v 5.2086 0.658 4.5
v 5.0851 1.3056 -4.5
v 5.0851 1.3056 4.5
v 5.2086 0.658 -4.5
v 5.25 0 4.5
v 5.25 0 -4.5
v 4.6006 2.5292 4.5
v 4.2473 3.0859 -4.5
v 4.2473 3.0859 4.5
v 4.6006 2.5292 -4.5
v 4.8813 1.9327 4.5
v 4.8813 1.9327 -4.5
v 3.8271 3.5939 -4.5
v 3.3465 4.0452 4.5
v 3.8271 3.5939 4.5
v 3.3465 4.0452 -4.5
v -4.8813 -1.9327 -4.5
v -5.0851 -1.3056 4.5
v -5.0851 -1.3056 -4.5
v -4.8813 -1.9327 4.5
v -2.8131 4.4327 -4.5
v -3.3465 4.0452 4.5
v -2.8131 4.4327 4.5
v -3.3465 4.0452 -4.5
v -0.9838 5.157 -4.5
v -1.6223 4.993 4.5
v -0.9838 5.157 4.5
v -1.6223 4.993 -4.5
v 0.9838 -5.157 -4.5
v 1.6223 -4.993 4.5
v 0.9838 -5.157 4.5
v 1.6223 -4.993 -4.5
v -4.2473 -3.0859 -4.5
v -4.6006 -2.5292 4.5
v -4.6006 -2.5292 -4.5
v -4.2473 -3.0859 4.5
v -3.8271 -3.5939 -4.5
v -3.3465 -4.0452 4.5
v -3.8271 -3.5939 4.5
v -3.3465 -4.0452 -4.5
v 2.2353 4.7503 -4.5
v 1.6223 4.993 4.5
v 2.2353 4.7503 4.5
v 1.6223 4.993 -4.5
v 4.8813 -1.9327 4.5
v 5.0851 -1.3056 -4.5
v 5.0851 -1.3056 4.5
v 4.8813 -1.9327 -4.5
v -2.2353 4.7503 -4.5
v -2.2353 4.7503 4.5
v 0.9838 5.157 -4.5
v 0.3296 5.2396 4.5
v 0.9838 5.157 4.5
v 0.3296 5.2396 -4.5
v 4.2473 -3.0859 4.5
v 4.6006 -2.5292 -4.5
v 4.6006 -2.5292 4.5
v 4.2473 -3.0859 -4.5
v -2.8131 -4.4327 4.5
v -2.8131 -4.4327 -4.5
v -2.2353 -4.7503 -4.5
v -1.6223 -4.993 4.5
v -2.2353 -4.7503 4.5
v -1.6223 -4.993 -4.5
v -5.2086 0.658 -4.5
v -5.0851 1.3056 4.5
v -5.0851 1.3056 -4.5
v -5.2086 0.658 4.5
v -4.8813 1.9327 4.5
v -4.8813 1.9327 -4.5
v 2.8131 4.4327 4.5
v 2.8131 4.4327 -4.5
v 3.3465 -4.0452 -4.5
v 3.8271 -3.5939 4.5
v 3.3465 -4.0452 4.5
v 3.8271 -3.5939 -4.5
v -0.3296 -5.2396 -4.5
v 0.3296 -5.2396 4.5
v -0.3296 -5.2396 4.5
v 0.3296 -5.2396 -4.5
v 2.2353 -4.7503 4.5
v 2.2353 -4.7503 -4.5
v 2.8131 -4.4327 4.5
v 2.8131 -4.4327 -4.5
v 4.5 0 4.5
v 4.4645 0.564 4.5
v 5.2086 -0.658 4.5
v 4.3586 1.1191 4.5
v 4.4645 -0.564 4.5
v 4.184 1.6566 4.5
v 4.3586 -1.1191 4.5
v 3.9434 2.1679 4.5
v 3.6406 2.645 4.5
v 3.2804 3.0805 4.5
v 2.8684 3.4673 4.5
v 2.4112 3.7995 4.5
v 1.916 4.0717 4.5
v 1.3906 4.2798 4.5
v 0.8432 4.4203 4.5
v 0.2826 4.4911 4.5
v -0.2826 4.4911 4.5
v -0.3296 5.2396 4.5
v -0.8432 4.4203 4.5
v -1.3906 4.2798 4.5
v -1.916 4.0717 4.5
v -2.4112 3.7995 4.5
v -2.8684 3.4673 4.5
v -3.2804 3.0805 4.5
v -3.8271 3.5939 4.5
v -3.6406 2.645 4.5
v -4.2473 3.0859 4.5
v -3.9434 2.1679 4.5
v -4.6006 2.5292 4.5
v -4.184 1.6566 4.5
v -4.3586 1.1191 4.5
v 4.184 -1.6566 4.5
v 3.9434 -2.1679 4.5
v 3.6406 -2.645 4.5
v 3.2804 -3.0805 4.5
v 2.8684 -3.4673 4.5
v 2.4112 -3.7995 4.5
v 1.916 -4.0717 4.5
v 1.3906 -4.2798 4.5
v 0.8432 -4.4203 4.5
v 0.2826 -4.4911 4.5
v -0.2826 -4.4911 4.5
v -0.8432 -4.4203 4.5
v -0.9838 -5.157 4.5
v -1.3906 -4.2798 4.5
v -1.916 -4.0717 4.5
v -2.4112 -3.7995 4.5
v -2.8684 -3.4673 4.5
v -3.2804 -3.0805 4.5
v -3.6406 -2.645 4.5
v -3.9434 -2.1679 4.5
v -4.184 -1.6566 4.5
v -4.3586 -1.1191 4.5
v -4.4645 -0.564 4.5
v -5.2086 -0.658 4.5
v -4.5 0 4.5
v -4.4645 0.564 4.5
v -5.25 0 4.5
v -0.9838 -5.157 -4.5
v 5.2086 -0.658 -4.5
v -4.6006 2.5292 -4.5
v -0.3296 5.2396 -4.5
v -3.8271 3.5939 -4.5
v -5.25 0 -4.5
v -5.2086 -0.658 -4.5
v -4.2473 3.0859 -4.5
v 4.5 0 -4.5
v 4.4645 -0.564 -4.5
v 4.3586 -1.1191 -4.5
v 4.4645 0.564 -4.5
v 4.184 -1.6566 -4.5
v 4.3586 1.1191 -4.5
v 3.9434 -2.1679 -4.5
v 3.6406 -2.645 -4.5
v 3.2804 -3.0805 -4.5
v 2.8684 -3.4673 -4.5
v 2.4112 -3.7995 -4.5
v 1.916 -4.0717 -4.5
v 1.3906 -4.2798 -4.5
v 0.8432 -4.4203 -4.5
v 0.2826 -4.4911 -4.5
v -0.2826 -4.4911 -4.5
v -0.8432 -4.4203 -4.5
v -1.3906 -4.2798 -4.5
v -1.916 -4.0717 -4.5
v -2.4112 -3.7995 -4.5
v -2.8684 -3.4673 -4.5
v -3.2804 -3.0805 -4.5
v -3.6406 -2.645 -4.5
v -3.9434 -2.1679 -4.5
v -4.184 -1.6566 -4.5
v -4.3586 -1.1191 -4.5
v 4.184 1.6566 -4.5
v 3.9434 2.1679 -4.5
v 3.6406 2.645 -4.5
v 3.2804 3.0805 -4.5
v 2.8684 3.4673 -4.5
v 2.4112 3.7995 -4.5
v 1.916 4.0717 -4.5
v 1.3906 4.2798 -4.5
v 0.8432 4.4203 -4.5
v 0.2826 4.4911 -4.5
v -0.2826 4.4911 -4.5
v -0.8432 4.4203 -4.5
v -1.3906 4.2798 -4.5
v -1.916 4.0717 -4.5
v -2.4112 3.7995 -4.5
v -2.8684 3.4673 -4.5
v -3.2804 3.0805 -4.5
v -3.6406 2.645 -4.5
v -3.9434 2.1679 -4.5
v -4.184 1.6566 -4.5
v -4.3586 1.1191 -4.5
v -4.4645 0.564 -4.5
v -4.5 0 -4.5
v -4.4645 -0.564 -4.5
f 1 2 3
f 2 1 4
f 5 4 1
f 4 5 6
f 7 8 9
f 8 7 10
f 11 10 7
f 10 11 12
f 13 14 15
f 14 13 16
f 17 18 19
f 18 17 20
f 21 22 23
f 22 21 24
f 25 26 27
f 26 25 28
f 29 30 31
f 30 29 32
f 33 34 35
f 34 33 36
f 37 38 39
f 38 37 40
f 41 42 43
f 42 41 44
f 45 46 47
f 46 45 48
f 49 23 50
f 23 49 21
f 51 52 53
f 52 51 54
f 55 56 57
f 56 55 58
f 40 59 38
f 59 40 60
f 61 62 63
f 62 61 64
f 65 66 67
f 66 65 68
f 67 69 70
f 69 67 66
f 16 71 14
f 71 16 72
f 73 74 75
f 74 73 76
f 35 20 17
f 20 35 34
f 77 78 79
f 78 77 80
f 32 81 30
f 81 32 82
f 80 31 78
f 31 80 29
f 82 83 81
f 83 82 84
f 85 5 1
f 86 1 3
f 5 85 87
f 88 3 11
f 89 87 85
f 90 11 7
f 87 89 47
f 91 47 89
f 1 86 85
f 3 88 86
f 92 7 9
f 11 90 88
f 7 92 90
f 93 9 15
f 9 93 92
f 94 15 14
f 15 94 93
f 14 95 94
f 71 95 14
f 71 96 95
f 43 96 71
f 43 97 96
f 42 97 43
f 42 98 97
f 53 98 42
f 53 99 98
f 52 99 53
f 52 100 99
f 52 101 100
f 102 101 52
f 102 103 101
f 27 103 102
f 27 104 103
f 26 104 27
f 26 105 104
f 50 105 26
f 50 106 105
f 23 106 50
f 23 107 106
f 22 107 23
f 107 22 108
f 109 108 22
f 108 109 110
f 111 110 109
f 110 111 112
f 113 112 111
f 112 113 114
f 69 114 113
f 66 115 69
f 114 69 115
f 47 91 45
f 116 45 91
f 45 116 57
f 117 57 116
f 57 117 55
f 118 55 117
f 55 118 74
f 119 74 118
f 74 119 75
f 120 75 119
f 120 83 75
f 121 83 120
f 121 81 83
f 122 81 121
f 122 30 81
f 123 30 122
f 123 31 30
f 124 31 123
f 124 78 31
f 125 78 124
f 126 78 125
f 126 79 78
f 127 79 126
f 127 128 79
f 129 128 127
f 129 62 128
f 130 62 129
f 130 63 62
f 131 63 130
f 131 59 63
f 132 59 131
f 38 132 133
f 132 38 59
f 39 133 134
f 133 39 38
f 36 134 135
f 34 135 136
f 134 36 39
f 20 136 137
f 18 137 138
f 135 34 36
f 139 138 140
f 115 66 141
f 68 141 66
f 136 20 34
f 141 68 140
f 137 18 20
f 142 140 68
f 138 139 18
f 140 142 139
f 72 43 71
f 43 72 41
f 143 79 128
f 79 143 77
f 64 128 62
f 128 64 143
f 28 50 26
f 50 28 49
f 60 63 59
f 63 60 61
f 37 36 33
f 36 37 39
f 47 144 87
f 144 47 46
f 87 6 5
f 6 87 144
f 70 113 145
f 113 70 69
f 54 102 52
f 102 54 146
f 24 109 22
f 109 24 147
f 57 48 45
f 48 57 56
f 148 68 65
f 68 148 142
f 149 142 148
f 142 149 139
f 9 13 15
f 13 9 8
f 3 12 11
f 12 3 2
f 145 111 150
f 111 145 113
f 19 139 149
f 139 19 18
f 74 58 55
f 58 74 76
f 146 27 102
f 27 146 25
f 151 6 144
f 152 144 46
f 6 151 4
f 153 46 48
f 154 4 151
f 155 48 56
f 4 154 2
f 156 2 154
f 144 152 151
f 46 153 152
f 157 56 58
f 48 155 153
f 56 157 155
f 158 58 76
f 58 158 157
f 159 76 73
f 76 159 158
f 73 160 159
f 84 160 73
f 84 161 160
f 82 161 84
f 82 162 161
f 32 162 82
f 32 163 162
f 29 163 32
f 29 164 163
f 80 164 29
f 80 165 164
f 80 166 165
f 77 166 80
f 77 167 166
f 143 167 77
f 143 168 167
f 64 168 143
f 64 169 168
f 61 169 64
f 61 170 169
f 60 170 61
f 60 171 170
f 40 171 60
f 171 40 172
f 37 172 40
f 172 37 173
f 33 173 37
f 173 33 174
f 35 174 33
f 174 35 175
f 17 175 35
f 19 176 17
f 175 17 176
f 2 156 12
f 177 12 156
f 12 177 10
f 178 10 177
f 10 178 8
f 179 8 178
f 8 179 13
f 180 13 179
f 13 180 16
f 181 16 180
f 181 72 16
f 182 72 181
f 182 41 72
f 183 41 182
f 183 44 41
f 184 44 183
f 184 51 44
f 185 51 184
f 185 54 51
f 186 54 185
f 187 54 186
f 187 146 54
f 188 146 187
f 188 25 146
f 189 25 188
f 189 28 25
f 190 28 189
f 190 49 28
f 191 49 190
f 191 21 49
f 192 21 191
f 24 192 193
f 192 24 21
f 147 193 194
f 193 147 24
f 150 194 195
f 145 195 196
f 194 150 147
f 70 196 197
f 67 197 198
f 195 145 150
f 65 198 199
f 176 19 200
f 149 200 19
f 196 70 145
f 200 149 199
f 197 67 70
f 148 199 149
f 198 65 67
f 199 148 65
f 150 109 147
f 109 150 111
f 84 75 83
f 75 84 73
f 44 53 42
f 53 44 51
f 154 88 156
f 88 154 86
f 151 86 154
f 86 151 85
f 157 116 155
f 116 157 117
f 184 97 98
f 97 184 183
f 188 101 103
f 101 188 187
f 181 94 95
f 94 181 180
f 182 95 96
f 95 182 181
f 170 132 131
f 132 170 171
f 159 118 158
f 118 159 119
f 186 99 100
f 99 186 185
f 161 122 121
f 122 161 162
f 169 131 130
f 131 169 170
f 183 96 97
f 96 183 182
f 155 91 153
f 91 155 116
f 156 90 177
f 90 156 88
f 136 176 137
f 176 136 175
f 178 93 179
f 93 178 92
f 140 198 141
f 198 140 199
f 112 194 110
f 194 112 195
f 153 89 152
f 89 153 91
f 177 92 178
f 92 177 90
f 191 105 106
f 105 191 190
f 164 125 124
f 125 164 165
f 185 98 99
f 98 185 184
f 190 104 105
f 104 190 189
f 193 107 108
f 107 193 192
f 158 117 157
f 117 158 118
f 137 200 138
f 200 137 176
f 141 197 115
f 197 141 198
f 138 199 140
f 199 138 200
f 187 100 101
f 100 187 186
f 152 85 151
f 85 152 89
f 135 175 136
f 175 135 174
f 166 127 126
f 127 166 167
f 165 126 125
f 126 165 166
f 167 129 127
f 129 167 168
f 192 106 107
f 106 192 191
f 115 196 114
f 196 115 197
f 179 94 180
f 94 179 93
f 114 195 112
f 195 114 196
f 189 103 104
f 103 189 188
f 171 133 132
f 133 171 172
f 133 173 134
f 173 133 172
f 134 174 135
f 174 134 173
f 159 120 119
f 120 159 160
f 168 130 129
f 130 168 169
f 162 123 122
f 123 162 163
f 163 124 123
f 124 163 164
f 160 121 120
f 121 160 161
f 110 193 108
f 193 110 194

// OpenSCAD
$fn = 50;


difference() {
	union() {
		translate(v = [0, 0, -4.5000000000]) {
			cylinder(h = 9, r = 5.2500000000);
		}
	}
	union() {
		translate(v = [0, 0, -100.0000000000]) {
			cylinder(h = 200, r = 4.5000000000);
		}
	}
}
